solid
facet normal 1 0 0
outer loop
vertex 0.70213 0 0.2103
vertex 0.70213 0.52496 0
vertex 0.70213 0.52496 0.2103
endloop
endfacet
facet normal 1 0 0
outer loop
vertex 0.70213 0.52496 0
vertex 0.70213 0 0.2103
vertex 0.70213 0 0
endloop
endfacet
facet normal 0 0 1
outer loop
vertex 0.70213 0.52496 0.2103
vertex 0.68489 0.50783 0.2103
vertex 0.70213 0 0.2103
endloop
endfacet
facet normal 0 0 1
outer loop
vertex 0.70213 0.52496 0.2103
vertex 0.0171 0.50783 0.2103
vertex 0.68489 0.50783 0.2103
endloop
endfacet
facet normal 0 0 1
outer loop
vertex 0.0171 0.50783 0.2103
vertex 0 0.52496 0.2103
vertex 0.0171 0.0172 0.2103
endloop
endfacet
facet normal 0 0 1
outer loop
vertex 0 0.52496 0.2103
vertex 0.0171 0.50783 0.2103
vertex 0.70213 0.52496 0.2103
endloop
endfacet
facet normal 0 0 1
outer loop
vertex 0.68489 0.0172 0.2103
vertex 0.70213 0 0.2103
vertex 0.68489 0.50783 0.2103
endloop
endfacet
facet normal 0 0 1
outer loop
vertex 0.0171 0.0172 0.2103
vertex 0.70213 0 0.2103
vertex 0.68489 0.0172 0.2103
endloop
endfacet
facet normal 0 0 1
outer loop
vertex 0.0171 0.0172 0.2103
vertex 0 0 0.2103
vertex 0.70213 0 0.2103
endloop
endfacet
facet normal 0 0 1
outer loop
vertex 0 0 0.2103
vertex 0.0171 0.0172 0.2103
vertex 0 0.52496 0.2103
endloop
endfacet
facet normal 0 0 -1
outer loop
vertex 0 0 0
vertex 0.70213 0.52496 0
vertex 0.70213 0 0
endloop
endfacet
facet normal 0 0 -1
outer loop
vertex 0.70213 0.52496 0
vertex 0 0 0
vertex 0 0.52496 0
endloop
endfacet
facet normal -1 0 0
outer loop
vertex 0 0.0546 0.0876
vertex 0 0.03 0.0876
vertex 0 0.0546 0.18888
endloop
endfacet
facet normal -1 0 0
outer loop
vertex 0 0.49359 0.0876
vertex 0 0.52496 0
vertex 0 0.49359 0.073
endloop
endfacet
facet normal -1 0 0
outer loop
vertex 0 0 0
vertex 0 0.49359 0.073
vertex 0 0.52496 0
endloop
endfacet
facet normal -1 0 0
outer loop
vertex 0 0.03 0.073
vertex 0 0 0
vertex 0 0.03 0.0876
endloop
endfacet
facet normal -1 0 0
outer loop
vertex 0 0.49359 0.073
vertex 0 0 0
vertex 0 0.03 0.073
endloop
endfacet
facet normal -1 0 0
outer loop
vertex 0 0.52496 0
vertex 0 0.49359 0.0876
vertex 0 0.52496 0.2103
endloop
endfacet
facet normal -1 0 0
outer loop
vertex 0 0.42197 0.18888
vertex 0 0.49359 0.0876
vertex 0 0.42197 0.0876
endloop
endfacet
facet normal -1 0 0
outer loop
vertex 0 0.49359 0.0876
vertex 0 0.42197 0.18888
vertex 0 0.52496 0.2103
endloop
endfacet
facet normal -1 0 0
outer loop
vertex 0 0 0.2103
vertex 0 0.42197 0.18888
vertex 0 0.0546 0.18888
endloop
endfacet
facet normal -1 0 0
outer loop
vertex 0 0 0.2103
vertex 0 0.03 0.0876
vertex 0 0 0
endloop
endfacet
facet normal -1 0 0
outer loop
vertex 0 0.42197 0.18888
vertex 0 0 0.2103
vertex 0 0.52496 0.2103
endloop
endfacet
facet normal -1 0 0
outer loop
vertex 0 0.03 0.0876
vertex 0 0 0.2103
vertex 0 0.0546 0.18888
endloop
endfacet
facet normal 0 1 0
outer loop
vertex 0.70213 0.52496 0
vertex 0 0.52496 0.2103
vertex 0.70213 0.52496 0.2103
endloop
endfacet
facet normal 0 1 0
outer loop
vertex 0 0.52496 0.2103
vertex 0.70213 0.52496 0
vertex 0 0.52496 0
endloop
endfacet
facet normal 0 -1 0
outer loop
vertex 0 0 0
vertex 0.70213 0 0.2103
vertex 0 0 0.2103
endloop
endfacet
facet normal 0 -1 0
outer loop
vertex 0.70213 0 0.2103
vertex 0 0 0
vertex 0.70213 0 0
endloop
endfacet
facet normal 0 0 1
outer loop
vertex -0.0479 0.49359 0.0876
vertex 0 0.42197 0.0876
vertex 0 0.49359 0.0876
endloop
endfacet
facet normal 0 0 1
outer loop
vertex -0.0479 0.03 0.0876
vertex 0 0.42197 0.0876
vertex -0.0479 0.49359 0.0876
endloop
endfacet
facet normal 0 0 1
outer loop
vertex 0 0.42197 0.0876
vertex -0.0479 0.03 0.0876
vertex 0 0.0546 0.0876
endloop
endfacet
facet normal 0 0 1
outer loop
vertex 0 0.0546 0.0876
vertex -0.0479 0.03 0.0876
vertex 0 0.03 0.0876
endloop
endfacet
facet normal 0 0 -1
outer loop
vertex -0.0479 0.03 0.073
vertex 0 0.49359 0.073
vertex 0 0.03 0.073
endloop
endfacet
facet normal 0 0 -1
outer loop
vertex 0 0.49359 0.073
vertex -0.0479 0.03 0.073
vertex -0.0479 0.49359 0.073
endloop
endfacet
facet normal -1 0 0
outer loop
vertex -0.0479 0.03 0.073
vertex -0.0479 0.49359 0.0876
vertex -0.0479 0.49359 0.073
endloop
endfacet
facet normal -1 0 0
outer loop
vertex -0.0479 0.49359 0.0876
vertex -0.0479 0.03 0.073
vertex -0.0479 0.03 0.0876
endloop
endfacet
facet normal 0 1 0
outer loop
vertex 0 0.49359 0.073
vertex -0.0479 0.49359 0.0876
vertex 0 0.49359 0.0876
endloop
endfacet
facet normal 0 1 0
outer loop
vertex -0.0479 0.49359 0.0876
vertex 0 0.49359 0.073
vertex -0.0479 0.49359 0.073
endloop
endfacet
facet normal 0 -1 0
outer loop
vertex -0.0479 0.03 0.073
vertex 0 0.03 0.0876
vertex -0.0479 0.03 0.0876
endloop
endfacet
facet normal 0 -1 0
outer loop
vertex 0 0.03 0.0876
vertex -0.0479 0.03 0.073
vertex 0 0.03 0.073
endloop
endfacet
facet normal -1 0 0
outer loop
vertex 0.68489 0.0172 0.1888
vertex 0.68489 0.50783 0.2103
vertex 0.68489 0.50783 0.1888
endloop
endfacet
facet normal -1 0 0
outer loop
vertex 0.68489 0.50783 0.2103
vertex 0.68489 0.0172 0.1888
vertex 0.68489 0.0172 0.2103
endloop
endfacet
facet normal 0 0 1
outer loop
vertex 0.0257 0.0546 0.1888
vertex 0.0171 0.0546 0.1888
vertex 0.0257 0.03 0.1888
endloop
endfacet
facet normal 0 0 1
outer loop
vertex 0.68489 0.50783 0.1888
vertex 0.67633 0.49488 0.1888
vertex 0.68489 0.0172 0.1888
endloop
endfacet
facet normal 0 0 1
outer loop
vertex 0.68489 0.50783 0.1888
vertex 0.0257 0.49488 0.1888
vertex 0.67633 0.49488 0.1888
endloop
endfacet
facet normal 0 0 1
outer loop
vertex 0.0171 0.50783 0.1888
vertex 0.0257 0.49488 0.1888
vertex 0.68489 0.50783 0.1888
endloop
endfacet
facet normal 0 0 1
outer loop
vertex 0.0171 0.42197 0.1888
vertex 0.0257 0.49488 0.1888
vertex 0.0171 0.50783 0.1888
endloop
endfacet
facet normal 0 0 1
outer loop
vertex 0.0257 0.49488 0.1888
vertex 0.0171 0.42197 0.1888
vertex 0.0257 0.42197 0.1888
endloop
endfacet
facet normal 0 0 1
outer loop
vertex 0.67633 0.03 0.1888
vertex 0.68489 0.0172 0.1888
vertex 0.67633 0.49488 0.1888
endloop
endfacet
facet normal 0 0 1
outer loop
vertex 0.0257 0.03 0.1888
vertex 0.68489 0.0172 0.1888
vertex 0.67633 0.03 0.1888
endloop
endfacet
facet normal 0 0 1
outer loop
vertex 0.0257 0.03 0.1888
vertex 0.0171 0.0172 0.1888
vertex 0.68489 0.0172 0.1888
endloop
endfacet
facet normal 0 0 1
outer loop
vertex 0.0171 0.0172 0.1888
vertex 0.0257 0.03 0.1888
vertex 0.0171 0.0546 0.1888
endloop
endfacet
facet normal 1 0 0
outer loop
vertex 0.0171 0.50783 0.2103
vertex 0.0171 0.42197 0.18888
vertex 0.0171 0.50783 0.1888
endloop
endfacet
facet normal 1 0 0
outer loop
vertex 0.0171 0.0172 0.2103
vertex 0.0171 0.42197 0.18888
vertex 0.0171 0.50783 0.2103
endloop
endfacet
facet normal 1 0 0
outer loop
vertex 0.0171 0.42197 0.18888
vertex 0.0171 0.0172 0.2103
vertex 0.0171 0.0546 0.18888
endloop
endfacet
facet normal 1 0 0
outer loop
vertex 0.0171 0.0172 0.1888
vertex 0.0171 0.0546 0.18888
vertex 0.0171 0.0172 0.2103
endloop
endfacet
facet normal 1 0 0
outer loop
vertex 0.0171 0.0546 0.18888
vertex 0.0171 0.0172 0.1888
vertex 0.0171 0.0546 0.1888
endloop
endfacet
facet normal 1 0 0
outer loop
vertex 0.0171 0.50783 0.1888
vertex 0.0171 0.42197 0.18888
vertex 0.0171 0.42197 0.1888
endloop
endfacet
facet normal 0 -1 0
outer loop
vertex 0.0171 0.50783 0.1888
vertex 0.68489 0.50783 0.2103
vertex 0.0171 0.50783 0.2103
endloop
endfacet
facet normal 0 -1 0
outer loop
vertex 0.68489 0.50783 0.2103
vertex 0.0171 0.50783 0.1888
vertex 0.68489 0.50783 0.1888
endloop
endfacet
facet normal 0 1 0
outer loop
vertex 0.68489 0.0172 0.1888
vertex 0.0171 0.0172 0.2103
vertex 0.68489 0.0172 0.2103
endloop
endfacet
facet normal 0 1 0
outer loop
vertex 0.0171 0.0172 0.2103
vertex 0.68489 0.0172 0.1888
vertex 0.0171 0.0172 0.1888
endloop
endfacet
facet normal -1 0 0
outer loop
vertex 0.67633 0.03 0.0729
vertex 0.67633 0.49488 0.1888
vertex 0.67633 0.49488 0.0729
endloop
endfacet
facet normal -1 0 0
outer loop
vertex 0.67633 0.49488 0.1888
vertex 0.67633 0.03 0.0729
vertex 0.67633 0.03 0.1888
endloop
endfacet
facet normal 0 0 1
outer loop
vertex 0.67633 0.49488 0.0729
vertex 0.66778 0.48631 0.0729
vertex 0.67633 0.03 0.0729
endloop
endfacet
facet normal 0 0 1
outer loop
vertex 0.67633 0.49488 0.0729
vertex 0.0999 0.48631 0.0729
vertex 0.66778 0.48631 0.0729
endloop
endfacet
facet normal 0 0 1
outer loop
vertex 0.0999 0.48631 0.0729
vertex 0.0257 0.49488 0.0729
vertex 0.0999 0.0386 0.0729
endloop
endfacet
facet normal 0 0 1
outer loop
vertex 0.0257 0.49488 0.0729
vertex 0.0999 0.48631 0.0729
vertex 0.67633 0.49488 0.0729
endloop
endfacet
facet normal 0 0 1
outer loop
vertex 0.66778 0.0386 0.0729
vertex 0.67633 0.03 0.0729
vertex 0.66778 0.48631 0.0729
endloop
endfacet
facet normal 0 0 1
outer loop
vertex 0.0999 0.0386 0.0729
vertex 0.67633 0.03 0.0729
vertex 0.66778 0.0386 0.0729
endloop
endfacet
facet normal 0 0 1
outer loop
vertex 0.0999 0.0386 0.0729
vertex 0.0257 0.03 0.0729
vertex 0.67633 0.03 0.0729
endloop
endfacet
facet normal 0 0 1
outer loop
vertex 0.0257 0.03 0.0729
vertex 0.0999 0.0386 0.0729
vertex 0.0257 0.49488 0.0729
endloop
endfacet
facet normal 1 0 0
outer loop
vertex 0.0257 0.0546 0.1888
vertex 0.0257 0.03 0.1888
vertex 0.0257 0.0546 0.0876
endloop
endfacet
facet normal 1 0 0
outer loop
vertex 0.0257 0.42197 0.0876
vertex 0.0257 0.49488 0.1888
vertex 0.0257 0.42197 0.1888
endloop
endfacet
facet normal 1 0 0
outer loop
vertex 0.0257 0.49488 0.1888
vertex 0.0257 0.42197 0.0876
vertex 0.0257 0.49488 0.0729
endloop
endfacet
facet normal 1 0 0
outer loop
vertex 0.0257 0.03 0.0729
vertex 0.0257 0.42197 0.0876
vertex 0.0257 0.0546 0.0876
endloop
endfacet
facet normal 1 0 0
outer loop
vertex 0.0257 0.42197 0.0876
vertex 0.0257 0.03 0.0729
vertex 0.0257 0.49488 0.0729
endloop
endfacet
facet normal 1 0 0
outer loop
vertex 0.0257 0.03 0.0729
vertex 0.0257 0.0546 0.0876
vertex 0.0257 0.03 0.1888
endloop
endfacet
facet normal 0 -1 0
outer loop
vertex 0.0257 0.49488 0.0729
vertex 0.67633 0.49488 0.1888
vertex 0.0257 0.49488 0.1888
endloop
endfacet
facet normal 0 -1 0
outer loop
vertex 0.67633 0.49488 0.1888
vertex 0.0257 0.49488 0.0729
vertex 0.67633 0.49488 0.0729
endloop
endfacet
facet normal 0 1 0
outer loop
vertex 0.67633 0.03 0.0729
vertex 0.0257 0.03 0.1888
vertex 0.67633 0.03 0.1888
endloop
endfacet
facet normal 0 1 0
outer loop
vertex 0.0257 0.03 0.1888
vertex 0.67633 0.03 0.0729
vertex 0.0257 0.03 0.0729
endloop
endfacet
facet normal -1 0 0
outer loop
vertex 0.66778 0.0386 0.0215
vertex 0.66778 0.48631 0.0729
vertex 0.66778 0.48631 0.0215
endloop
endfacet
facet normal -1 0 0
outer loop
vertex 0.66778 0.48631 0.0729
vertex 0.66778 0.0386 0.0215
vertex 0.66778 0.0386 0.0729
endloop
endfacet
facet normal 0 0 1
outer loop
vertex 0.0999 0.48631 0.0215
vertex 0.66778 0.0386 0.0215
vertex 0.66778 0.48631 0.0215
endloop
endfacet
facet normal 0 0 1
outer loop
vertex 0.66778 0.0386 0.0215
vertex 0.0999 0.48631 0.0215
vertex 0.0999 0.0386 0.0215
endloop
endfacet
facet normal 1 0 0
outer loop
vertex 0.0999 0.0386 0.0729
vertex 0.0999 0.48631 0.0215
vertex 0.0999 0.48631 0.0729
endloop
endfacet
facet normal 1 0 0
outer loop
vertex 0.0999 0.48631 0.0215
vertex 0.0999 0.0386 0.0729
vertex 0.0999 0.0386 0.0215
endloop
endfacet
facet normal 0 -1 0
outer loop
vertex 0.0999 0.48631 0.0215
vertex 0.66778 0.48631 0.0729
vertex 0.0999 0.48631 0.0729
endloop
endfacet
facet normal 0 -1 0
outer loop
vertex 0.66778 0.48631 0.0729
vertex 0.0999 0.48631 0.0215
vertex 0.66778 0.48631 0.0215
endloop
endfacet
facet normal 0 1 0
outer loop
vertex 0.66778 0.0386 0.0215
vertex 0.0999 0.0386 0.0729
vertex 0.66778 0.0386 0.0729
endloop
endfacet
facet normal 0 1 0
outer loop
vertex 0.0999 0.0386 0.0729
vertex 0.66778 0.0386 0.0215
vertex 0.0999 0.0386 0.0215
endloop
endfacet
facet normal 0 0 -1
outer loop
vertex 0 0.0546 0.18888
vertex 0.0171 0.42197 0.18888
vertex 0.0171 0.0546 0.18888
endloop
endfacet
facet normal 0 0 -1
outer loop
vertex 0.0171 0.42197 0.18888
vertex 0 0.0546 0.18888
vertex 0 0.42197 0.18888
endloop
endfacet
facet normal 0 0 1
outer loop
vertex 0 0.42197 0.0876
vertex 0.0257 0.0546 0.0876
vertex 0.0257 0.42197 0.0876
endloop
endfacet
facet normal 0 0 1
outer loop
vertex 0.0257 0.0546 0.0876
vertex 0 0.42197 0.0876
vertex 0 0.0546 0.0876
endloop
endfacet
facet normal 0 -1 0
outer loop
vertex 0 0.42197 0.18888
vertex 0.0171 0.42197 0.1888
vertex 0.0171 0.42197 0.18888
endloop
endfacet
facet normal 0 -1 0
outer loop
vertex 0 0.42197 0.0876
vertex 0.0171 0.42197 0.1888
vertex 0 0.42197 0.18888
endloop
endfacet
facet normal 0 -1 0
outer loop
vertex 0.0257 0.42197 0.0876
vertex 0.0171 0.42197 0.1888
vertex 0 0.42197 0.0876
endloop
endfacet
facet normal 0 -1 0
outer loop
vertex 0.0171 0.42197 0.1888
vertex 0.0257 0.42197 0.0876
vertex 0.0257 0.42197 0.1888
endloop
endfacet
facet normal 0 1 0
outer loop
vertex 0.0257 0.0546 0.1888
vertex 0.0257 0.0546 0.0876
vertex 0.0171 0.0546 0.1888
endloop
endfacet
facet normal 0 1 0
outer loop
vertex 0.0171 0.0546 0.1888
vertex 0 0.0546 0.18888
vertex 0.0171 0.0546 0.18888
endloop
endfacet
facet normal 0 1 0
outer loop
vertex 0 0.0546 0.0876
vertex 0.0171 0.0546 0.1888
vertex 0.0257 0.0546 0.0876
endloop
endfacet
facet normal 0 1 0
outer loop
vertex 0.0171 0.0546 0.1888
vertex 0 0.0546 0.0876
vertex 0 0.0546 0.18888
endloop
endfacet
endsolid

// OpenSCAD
$fn = 100;

// Main Body Dimensions
body_len_x = 0.702127;
body_len_y = 0.524964;
body_len_z = 0.2103;

// Top Shallow Recess
rec1_off_x = 0.0171;
rec1_off_y = 0.0172;
rec1_off_z = 0.1888;
rec1_len_x = 0.667793;
rec1_len_y = 0.490631;
rec1_len_z = 0.0215;

// Middle Continuation Recess
rec2_off_x = 0.0257;
rec2_off_y = 0.03;
rec2_off_z = 0.0729;
rec2_len_x = 0.650626;
rec2_len_y = 0.46488;
rec2_len_z = 0.1159;

// Lower Pocket
pkt_off_x = 0.0999;
pkt_off_y = 0.0386;
pkt_off_z = 0.0215;
pkt_len_x = 0.567882;
pkt_len_y = 0.447713;
pkt_len_z = 0.0515;

// Side Projection (Added Solid)
proj_off_x = -0.0479;
proj_off_y = 0.03;
proj_off_z = 0.073;
proj_len_x = 0.130618;
proj_len_y = 0.463588;
proj_len_z = 0.0146;

// Side Recess (Cut)
sideRec_off_x = 0.0;
sideRec_off_y = 0.0546;
sideRec_off_z = 0.0876;
sideRec_len_x = 0.0343;
sideRec_len_y = 0.367372;
sideRec_len_z = 0.101285;

// Model Assembly
difference() {
    // Base volume + side projection
    union() {
        cube([body_len_x, body_len_y, body_len_z], center=false);
        translate([proj_off_x, proj_off_y, proj_off_z])
            cube([proj_len_x, proj_len_y, proj_len_z], center=false);
    }

    // Remove top shallow recess
    translate([rec1_off_x, rec1_off_y, rec1_off_z])
        cube([rec1_len_x, rec1_len_y, rec1_len_z], center=false);

    // Remove middle continuation recess
    translate([rec2_off_x, rec2_off_y, rec2_off_z])
        cube([rec2_len_x, rec2_len_y, rec2_len_z], center=false);

    // Remove lower pocket
    translate([pkt_off_x, pkt_off_y, pkt_off_z])
        cube([pkt_len_x, pkt_len_y, pkt_len_z], center=false);

    // Remove side recess
    translate([sideRec_off_x, sideRec_off_y, sideRec_off_z])
        cube([sideRec_len_x, sideRec_len_y, sideRec_len_z], center=false);
}
